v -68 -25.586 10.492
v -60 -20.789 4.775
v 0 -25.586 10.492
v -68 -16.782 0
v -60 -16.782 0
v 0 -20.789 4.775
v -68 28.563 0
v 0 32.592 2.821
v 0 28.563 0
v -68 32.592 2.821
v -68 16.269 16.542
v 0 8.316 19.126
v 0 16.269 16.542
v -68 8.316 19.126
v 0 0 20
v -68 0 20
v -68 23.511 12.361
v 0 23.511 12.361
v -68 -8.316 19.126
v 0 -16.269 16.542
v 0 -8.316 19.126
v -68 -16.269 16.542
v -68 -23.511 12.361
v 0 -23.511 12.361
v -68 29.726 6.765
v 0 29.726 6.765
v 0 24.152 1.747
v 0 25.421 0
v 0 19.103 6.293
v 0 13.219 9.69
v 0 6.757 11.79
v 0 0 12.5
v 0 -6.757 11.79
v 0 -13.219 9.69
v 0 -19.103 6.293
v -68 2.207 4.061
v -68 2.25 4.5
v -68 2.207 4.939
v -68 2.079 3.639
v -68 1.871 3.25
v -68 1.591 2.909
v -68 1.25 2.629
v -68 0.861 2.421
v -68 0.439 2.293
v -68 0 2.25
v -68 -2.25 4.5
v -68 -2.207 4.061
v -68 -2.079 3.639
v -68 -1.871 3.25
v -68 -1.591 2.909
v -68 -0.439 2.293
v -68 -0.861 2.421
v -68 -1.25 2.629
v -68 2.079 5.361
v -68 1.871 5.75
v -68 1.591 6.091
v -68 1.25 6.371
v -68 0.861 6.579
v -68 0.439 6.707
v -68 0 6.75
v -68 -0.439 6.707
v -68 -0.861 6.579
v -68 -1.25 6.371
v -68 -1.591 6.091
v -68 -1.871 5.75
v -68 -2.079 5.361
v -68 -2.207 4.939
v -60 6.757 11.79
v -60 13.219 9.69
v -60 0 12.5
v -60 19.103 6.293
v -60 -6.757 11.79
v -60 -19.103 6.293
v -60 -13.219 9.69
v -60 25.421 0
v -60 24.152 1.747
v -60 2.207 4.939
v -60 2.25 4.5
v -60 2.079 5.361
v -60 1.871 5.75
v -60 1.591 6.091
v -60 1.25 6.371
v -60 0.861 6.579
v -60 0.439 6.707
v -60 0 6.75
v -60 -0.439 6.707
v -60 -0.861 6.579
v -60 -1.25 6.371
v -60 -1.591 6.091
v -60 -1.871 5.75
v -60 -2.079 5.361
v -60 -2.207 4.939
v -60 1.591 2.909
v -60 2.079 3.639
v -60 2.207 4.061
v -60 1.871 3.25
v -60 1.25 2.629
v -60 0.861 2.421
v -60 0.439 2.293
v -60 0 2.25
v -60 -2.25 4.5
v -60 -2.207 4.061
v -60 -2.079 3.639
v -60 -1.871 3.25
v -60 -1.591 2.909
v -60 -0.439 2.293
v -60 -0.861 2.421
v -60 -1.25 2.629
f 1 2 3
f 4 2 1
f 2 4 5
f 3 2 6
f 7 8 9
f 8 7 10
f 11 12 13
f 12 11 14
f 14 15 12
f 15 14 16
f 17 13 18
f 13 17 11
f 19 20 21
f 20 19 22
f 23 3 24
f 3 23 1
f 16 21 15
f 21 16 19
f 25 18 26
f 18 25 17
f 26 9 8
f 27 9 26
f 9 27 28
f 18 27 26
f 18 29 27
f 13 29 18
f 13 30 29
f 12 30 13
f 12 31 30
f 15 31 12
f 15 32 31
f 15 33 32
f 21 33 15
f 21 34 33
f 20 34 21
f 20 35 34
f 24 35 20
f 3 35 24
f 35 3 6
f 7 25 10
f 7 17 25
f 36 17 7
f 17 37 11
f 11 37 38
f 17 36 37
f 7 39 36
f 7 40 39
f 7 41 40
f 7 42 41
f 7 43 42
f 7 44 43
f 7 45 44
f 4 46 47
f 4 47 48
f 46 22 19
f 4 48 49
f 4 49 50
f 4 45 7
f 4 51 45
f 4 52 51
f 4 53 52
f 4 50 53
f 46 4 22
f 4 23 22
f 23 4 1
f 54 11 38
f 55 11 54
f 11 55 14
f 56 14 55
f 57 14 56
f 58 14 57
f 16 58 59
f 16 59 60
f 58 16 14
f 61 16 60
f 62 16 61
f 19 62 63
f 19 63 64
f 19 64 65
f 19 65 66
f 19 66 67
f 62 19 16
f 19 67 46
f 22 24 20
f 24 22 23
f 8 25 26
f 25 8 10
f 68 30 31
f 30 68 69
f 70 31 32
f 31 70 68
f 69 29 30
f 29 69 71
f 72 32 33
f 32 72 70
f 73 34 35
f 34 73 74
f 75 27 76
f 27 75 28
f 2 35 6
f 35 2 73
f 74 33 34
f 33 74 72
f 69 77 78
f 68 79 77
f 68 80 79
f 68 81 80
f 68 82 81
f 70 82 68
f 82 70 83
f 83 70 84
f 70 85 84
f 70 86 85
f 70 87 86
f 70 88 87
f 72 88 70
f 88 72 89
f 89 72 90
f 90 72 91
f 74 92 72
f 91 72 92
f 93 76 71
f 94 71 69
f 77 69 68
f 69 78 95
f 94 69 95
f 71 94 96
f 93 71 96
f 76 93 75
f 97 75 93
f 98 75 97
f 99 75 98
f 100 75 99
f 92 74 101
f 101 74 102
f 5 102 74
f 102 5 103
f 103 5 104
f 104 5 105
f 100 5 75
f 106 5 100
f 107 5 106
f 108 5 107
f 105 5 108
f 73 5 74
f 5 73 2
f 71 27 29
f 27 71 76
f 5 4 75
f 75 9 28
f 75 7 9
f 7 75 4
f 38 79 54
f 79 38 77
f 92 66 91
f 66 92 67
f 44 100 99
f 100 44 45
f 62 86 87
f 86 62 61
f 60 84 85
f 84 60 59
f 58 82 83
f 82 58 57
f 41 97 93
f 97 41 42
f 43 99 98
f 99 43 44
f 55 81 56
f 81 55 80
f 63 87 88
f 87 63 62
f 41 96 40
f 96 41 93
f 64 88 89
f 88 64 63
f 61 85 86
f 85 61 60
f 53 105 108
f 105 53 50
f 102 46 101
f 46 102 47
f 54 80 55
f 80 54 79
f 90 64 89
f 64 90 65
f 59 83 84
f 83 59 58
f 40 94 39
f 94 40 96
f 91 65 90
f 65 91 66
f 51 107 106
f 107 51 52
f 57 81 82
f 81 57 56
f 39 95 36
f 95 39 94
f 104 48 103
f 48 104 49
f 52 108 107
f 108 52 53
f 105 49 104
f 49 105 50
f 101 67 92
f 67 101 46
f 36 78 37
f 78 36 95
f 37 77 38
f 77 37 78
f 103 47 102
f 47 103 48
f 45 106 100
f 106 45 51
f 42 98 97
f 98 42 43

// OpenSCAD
diameter_inner = 65;
diameter_outer = 80;

mount_thickness = 8;
guard_length = 60;

magic_offset_1 = 20;

mount_hole_diameter = 4.5;
mount_hole_offset = 4.5;


intersection()
{
  difference()
  {
    translate([0, 0, -magic_offset_1])
    {
      rotate([0, -90, 0])
      {
        difference()
        {
          cylinder(d=diameter_outer, h=guard_length+mount_thickness);

          translate([0, 0, -1])
          {
            cylinder(d=diameter_inner, h=guard_length+1);
          }

          for (a = [50, -35])
          {
            rotate([0, 0, a])
            {
              translate([-50, 0, 0])
              {
                cube([100, 200, 200], center=true);
              }
            }
          }
        }
      }
    }

    translate([0, 0, -50])
    {
      cube([200, 200, 100], center=true);
    }

    rotate([0, -90, 0])
    {
      translate([mount_hole_offset, 0, guard_length-1])
      {
        cylinder(d=mount_hole_diameter, h=mount_thickness+2, $fn=32);
      }
    }
  }
}
